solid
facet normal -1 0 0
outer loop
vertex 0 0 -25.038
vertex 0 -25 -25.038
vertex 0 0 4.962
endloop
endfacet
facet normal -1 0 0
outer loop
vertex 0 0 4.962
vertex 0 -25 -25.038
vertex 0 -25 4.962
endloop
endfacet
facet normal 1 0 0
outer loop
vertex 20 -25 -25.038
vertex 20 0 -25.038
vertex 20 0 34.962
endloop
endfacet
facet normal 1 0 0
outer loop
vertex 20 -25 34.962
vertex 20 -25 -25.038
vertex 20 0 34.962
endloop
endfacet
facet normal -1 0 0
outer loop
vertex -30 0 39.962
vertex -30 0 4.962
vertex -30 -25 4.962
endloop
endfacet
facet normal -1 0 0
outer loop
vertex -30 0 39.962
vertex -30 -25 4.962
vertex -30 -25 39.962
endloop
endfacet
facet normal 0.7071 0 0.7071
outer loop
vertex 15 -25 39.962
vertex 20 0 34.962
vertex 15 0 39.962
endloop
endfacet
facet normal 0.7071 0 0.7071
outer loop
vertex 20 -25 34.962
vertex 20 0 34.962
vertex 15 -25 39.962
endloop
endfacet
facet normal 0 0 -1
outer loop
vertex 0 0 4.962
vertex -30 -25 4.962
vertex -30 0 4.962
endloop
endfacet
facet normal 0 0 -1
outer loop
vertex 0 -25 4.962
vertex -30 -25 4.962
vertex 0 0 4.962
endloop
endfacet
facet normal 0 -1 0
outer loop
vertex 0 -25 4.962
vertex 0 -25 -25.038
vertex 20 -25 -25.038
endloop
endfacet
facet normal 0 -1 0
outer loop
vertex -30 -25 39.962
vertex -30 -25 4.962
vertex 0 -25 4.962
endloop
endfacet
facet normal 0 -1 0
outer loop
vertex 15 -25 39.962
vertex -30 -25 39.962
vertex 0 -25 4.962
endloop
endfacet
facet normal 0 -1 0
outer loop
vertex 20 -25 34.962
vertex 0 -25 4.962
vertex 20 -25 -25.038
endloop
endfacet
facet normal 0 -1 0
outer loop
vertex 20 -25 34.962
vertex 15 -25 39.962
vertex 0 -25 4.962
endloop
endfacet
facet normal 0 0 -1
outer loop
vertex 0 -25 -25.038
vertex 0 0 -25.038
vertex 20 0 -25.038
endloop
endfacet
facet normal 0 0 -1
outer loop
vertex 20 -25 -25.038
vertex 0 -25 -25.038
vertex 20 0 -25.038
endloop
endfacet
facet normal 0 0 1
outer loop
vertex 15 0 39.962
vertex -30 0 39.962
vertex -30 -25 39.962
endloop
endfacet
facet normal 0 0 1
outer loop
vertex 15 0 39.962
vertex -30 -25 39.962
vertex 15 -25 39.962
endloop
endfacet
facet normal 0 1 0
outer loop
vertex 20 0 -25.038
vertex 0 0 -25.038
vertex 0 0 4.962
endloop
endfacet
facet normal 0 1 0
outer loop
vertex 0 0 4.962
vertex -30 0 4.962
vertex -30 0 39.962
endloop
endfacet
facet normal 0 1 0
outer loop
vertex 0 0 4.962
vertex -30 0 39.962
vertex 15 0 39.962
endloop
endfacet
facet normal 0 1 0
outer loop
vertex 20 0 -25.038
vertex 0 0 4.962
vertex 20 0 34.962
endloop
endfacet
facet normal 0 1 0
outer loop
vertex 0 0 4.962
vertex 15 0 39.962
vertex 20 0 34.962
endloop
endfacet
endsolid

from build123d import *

# Parameters (mm, degrees)
F4_W     = 50
F4_H     = 65
F0_DEPTH = 25
F1_W     = 30
F1_H     = 30
F2_DEPTH = 25
F3_SIZE  = 5


with BuildPart() as f0:
    # F4 (on Front) → F0 (new body)
    with BuildSketch(Plane.XZ):
        with Locations((-5, 7.461506)):
            Rectangle(F4_W, F4_H)
    extrude(amount=F0_DEPTH)

    # F1 (on face) → F2 (cut)
    with BuildSketch(Plane.XZ.offset(25)):
        with Locations((-15, -10.038494)):
            Rectangle(F1_W, F1_H)
    extrude(amount=-F2_DEPTH, mode=Mode.SUBTRACT)

    # F3
    f3_edges = [f0.edges().sort_by_distance(p)[0] for p in [
        (20, -12.5, 39.961506),
    ]]
    chamfer(f3_edges, length=F3_SIZE)


solid = f0.part
